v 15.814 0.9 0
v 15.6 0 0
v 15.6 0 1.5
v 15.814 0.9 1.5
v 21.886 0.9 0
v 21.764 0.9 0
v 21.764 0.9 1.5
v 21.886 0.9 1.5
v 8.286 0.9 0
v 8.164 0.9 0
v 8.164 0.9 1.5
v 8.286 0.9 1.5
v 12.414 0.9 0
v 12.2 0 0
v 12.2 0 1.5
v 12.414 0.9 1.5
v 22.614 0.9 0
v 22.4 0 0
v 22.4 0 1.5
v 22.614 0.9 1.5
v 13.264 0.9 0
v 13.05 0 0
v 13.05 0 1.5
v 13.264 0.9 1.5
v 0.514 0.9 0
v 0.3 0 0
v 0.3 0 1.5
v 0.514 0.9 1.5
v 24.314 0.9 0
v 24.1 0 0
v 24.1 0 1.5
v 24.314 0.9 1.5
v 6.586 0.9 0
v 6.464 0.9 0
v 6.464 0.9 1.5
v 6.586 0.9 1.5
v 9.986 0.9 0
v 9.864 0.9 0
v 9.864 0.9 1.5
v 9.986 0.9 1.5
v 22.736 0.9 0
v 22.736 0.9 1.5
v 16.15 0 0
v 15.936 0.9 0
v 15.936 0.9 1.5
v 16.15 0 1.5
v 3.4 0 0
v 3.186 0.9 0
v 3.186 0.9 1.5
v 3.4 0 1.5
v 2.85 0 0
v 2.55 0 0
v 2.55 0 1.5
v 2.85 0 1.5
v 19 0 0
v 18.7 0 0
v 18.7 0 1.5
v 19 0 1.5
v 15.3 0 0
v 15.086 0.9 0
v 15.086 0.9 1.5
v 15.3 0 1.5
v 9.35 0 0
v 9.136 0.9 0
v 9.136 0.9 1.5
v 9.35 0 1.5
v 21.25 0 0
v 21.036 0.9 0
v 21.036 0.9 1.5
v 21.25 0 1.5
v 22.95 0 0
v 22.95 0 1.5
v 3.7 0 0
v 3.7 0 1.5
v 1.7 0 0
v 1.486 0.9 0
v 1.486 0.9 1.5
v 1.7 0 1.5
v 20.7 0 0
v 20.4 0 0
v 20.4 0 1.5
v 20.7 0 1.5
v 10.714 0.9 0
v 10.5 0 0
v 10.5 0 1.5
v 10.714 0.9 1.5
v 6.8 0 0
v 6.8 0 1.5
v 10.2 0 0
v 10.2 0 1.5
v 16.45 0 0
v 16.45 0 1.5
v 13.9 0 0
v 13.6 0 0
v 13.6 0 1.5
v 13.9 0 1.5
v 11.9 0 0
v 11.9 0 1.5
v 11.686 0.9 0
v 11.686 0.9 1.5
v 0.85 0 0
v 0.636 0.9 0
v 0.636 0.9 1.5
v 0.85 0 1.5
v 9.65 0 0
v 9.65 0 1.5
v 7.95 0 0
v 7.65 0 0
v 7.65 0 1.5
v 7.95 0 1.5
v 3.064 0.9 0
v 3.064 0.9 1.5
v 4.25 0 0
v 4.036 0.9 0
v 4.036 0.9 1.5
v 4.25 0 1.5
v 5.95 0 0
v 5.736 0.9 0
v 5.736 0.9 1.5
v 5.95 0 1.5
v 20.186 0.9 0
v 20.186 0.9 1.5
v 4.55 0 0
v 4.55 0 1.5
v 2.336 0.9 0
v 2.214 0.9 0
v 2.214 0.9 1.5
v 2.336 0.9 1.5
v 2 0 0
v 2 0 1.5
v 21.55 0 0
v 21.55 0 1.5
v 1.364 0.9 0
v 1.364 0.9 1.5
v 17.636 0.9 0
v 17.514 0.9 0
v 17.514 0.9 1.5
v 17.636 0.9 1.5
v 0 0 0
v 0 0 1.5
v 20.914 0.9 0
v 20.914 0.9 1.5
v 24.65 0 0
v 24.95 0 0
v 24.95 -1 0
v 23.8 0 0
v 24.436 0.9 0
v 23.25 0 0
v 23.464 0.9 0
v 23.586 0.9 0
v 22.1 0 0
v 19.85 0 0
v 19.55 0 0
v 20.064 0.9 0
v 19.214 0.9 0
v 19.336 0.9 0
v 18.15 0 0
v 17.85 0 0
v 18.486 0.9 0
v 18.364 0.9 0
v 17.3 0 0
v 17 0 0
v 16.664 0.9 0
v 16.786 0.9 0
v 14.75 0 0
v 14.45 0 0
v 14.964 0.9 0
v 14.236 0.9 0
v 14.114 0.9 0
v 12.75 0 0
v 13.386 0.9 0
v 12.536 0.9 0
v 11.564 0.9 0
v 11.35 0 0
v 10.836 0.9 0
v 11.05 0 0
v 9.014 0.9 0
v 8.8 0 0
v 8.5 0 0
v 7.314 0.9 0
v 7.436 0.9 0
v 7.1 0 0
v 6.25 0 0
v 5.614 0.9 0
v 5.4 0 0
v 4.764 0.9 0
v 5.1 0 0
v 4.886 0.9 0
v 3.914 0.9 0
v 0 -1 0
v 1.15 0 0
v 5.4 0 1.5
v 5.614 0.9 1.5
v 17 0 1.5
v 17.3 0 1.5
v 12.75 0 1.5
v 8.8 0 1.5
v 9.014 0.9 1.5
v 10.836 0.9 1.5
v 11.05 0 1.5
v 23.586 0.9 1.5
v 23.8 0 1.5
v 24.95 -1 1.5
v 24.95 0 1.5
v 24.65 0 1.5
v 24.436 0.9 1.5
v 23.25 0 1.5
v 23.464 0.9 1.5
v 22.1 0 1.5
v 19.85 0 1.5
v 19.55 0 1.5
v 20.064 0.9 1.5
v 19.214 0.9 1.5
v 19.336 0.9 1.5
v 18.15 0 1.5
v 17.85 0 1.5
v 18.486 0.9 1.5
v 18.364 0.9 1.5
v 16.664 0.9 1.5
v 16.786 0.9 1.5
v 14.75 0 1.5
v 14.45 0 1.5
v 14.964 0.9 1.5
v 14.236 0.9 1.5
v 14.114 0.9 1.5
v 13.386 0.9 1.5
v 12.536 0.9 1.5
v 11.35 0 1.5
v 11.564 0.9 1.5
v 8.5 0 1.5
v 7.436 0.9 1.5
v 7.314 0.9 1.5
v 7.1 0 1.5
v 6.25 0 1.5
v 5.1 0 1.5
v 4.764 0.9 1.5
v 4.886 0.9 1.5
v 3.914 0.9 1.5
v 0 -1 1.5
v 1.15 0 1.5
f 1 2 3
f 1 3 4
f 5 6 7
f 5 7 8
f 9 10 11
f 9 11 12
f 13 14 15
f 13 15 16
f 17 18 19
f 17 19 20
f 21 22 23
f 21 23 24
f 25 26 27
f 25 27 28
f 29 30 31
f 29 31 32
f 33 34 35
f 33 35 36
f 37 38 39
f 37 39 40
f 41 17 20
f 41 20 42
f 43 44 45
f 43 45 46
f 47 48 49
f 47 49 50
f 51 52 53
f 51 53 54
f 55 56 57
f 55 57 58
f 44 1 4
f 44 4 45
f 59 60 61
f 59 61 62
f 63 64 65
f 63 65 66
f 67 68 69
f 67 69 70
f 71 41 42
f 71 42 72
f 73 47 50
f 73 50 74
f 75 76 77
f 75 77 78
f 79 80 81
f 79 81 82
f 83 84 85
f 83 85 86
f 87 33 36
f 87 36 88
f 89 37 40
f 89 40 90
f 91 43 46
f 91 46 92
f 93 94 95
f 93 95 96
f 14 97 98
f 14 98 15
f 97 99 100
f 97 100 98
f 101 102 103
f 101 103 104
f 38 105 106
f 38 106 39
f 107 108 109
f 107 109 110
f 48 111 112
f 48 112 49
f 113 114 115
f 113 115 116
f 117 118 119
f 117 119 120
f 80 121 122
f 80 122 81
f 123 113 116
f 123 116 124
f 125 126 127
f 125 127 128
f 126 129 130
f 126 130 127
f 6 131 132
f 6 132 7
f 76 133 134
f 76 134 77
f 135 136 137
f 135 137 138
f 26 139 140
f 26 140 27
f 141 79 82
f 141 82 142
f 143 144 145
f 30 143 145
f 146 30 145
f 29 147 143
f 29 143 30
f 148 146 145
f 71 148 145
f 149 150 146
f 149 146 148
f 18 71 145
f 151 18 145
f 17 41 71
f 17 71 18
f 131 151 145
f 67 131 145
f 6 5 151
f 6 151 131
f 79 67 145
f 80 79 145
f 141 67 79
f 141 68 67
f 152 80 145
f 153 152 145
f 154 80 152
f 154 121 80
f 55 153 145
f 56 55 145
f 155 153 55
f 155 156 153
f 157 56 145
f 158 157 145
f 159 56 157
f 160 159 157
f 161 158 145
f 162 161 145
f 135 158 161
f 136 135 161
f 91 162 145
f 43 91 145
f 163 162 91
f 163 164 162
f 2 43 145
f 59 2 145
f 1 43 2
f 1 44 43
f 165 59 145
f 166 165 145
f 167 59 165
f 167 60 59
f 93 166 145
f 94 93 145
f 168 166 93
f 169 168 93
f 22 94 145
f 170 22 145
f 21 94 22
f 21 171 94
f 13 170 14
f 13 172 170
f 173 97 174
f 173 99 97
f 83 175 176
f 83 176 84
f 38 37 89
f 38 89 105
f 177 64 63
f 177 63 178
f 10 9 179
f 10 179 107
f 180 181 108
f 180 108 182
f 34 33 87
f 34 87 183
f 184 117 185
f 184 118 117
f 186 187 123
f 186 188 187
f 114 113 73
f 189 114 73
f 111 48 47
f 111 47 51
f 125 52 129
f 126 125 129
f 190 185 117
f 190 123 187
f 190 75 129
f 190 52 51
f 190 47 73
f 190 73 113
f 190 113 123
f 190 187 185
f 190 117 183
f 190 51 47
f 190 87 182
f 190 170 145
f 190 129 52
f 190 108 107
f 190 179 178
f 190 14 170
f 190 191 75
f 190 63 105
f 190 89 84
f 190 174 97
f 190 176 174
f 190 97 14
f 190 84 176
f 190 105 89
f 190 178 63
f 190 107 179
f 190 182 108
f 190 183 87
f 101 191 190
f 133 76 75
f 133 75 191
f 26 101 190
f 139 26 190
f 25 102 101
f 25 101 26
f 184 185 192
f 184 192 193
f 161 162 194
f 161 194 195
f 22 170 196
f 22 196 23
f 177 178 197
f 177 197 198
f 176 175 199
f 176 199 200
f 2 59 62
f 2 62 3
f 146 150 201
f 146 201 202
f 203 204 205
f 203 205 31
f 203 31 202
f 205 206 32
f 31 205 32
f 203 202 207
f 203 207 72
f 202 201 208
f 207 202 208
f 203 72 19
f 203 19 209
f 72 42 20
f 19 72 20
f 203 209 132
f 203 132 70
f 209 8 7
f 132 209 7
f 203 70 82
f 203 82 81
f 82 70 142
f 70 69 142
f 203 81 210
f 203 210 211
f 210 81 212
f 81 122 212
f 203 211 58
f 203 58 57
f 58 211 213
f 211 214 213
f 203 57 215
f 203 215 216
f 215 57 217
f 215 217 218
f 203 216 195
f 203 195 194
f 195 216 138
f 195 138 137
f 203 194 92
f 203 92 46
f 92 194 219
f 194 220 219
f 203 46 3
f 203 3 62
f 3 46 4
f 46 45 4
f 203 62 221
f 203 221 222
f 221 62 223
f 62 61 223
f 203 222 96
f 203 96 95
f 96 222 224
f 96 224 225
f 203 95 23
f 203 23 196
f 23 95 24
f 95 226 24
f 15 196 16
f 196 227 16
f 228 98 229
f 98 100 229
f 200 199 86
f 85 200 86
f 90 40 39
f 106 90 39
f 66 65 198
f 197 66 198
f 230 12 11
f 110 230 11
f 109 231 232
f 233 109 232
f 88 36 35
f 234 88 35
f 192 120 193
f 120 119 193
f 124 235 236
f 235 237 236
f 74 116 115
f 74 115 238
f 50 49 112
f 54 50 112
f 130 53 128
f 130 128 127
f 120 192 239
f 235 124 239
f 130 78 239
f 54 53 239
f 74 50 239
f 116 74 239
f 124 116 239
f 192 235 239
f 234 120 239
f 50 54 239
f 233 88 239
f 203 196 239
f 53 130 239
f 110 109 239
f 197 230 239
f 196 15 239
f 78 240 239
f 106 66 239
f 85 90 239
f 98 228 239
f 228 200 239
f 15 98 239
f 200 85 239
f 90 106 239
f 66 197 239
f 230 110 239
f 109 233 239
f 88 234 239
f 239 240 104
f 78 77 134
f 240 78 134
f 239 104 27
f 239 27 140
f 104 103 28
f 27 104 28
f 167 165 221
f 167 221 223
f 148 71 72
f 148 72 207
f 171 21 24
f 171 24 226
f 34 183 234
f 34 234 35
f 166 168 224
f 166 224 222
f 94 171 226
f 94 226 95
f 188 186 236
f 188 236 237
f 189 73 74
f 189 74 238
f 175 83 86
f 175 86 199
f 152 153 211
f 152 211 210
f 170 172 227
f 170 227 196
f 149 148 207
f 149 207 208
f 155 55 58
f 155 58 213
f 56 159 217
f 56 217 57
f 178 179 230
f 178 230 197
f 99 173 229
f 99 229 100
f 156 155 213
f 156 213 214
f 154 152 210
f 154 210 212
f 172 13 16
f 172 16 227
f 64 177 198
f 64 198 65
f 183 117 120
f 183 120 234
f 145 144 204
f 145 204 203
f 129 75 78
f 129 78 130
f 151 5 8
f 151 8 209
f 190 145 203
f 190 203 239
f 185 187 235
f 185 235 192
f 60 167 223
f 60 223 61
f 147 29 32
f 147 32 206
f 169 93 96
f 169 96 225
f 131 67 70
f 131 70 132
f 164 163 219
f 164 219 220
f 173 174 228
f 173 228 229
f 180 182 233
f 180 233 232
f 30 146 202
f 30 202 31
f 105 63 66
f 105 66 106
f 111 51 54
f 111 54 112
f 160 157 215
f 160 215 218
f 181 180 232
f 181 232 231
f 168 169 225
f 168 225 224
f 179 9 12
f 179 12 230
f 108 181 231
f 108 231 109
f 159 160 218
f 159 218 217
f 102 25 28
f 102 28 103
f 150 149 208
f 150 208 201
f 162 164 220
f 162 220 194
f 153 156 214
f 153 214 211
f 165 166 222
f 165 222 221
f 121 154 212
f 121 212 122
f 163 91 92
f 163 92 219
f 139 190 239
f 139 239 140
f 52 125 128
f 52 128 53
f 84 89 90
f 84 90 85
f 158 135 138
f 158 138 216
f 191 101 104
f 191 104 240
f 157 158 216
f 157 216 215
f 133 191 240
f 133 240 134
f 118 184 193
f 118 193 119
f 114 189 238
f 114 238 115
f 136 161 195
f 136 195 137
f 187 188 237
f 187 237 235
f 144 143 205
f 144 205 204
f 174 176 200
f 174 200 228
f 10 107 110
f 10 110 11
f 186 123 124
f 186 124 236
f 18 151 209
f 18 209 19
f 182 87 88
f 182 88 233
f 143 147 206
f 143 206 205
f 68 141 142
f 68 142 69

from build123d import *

# Parameters (mm, degrees)
BOSS_EXTRUDE1_DEPTH = 1.5


with BuildPart() as part:
    # Sketch1 → Boss-Extrude1 (new body)
    with BuildSketch(Plane.XY):
        Polygon((0, 0), (0.3, 0), (0.513946728, 0.9), (0.636053272, 0.9), (0.85, 0), (1.15, 0), (1.363946728, 0.9), (1.486053272, 0.9), (1.7, 0), (2, 0), (2.213946728, 0.9), (2.336053272, 0.9), (2.55, 0), (2.85, 0), (3.063946728, 0.9), (3.186053272, 0.9), (3.4, 0), (3.7, 0), (3.913946728, 0.9), (4.036053272, 0.9), (4.25, 0), (4.55, 0), (4.763946728, 0.9), (4.886053272, 0.9), (5.1, 0), (5.4, 0), (5.613946728, 0.9), (5.736053272, 0.9), (5.95, 0), (6.25, 0), (6.463946728, 0.9), (6.586053272, 0.9), (6.8, 0), (7.1, 0), (7.313946728, 0.9), (7.436053272, 0.9), (7.65, 0), (7.95, 0), (8.163946728, 0.9), (8.286053272, 0.9), (8.5, 0), (8.8, 0), (9.013946728, 0.9), (9.136053272, 0.9), (9.35, 0), (9.65, 0), (9.863946728, 0.9), (9.986053272, 0.9), (10.2, 0), (10.5, 0), (10.713946728, 0.9), (10.836053272, 0.9), (11.05, 0), (11.35, 0), (11.563946728, 0.9), (11.686053272, 0.9), (11.9, 0), (12.2, 0), (12.413946728, 0.9), (12.536053272, 0.9), (12.75, 0), (13.05, 0), (13.263946728, 0.9), (13.386053272, 0.9), (13.6, 0), (13.9, 0), (14.113946728, 0.9), (14.236053272, 0.9), (14.45, 0), (14.75, 0), (14.963946728, 0.9), (15.086053272, 0.9), (15.3, 0), (15.6, 0), (15.813946728, 0.9), (15.936053272, 0.9), (16.15, 0), (16.45, 0), (16.663946728, 0.9), (16.786053272, 0.9), (17, 0), (17.3, 0), (17.513946728, 0.9), (17.636053272, 0.9), (17.85, 0), (18.15, 0), (18.363946728, 0.9), (18.486053272, 0.9), (18.7, 0), (19, 0), (19.213946728, 0.9), (19.336053272, 0.9), (19.55, 0), (19.85, 0), (20.063946728, 0.9), (20.186053272, 0.9), (20.4, 0), (20.7, 0), (20.913946728, 0.9), (21.036053272, 0.9), (21.25, 0), (21.55, 0), (21.763946728, 0.9), (21.886053272, 0.9), (22.1, 0), (22.4, 0), (22.613946728, 0.9), (22.736053272, 0.9), (22.95, 0), (23.25, 0), (23.463946728, 0.9), (23.586053272, 0.9), (23.8, 0), (24.1, 0), (24.313946728, 0.9), (24.436053272, 0.9), (24.65, 0), (24.95, 0), (24.95, -1), (0, -1), align=None)
    extrude(amount=BOSS_EXTRUDE1_DEPTH)


solid = part.part
